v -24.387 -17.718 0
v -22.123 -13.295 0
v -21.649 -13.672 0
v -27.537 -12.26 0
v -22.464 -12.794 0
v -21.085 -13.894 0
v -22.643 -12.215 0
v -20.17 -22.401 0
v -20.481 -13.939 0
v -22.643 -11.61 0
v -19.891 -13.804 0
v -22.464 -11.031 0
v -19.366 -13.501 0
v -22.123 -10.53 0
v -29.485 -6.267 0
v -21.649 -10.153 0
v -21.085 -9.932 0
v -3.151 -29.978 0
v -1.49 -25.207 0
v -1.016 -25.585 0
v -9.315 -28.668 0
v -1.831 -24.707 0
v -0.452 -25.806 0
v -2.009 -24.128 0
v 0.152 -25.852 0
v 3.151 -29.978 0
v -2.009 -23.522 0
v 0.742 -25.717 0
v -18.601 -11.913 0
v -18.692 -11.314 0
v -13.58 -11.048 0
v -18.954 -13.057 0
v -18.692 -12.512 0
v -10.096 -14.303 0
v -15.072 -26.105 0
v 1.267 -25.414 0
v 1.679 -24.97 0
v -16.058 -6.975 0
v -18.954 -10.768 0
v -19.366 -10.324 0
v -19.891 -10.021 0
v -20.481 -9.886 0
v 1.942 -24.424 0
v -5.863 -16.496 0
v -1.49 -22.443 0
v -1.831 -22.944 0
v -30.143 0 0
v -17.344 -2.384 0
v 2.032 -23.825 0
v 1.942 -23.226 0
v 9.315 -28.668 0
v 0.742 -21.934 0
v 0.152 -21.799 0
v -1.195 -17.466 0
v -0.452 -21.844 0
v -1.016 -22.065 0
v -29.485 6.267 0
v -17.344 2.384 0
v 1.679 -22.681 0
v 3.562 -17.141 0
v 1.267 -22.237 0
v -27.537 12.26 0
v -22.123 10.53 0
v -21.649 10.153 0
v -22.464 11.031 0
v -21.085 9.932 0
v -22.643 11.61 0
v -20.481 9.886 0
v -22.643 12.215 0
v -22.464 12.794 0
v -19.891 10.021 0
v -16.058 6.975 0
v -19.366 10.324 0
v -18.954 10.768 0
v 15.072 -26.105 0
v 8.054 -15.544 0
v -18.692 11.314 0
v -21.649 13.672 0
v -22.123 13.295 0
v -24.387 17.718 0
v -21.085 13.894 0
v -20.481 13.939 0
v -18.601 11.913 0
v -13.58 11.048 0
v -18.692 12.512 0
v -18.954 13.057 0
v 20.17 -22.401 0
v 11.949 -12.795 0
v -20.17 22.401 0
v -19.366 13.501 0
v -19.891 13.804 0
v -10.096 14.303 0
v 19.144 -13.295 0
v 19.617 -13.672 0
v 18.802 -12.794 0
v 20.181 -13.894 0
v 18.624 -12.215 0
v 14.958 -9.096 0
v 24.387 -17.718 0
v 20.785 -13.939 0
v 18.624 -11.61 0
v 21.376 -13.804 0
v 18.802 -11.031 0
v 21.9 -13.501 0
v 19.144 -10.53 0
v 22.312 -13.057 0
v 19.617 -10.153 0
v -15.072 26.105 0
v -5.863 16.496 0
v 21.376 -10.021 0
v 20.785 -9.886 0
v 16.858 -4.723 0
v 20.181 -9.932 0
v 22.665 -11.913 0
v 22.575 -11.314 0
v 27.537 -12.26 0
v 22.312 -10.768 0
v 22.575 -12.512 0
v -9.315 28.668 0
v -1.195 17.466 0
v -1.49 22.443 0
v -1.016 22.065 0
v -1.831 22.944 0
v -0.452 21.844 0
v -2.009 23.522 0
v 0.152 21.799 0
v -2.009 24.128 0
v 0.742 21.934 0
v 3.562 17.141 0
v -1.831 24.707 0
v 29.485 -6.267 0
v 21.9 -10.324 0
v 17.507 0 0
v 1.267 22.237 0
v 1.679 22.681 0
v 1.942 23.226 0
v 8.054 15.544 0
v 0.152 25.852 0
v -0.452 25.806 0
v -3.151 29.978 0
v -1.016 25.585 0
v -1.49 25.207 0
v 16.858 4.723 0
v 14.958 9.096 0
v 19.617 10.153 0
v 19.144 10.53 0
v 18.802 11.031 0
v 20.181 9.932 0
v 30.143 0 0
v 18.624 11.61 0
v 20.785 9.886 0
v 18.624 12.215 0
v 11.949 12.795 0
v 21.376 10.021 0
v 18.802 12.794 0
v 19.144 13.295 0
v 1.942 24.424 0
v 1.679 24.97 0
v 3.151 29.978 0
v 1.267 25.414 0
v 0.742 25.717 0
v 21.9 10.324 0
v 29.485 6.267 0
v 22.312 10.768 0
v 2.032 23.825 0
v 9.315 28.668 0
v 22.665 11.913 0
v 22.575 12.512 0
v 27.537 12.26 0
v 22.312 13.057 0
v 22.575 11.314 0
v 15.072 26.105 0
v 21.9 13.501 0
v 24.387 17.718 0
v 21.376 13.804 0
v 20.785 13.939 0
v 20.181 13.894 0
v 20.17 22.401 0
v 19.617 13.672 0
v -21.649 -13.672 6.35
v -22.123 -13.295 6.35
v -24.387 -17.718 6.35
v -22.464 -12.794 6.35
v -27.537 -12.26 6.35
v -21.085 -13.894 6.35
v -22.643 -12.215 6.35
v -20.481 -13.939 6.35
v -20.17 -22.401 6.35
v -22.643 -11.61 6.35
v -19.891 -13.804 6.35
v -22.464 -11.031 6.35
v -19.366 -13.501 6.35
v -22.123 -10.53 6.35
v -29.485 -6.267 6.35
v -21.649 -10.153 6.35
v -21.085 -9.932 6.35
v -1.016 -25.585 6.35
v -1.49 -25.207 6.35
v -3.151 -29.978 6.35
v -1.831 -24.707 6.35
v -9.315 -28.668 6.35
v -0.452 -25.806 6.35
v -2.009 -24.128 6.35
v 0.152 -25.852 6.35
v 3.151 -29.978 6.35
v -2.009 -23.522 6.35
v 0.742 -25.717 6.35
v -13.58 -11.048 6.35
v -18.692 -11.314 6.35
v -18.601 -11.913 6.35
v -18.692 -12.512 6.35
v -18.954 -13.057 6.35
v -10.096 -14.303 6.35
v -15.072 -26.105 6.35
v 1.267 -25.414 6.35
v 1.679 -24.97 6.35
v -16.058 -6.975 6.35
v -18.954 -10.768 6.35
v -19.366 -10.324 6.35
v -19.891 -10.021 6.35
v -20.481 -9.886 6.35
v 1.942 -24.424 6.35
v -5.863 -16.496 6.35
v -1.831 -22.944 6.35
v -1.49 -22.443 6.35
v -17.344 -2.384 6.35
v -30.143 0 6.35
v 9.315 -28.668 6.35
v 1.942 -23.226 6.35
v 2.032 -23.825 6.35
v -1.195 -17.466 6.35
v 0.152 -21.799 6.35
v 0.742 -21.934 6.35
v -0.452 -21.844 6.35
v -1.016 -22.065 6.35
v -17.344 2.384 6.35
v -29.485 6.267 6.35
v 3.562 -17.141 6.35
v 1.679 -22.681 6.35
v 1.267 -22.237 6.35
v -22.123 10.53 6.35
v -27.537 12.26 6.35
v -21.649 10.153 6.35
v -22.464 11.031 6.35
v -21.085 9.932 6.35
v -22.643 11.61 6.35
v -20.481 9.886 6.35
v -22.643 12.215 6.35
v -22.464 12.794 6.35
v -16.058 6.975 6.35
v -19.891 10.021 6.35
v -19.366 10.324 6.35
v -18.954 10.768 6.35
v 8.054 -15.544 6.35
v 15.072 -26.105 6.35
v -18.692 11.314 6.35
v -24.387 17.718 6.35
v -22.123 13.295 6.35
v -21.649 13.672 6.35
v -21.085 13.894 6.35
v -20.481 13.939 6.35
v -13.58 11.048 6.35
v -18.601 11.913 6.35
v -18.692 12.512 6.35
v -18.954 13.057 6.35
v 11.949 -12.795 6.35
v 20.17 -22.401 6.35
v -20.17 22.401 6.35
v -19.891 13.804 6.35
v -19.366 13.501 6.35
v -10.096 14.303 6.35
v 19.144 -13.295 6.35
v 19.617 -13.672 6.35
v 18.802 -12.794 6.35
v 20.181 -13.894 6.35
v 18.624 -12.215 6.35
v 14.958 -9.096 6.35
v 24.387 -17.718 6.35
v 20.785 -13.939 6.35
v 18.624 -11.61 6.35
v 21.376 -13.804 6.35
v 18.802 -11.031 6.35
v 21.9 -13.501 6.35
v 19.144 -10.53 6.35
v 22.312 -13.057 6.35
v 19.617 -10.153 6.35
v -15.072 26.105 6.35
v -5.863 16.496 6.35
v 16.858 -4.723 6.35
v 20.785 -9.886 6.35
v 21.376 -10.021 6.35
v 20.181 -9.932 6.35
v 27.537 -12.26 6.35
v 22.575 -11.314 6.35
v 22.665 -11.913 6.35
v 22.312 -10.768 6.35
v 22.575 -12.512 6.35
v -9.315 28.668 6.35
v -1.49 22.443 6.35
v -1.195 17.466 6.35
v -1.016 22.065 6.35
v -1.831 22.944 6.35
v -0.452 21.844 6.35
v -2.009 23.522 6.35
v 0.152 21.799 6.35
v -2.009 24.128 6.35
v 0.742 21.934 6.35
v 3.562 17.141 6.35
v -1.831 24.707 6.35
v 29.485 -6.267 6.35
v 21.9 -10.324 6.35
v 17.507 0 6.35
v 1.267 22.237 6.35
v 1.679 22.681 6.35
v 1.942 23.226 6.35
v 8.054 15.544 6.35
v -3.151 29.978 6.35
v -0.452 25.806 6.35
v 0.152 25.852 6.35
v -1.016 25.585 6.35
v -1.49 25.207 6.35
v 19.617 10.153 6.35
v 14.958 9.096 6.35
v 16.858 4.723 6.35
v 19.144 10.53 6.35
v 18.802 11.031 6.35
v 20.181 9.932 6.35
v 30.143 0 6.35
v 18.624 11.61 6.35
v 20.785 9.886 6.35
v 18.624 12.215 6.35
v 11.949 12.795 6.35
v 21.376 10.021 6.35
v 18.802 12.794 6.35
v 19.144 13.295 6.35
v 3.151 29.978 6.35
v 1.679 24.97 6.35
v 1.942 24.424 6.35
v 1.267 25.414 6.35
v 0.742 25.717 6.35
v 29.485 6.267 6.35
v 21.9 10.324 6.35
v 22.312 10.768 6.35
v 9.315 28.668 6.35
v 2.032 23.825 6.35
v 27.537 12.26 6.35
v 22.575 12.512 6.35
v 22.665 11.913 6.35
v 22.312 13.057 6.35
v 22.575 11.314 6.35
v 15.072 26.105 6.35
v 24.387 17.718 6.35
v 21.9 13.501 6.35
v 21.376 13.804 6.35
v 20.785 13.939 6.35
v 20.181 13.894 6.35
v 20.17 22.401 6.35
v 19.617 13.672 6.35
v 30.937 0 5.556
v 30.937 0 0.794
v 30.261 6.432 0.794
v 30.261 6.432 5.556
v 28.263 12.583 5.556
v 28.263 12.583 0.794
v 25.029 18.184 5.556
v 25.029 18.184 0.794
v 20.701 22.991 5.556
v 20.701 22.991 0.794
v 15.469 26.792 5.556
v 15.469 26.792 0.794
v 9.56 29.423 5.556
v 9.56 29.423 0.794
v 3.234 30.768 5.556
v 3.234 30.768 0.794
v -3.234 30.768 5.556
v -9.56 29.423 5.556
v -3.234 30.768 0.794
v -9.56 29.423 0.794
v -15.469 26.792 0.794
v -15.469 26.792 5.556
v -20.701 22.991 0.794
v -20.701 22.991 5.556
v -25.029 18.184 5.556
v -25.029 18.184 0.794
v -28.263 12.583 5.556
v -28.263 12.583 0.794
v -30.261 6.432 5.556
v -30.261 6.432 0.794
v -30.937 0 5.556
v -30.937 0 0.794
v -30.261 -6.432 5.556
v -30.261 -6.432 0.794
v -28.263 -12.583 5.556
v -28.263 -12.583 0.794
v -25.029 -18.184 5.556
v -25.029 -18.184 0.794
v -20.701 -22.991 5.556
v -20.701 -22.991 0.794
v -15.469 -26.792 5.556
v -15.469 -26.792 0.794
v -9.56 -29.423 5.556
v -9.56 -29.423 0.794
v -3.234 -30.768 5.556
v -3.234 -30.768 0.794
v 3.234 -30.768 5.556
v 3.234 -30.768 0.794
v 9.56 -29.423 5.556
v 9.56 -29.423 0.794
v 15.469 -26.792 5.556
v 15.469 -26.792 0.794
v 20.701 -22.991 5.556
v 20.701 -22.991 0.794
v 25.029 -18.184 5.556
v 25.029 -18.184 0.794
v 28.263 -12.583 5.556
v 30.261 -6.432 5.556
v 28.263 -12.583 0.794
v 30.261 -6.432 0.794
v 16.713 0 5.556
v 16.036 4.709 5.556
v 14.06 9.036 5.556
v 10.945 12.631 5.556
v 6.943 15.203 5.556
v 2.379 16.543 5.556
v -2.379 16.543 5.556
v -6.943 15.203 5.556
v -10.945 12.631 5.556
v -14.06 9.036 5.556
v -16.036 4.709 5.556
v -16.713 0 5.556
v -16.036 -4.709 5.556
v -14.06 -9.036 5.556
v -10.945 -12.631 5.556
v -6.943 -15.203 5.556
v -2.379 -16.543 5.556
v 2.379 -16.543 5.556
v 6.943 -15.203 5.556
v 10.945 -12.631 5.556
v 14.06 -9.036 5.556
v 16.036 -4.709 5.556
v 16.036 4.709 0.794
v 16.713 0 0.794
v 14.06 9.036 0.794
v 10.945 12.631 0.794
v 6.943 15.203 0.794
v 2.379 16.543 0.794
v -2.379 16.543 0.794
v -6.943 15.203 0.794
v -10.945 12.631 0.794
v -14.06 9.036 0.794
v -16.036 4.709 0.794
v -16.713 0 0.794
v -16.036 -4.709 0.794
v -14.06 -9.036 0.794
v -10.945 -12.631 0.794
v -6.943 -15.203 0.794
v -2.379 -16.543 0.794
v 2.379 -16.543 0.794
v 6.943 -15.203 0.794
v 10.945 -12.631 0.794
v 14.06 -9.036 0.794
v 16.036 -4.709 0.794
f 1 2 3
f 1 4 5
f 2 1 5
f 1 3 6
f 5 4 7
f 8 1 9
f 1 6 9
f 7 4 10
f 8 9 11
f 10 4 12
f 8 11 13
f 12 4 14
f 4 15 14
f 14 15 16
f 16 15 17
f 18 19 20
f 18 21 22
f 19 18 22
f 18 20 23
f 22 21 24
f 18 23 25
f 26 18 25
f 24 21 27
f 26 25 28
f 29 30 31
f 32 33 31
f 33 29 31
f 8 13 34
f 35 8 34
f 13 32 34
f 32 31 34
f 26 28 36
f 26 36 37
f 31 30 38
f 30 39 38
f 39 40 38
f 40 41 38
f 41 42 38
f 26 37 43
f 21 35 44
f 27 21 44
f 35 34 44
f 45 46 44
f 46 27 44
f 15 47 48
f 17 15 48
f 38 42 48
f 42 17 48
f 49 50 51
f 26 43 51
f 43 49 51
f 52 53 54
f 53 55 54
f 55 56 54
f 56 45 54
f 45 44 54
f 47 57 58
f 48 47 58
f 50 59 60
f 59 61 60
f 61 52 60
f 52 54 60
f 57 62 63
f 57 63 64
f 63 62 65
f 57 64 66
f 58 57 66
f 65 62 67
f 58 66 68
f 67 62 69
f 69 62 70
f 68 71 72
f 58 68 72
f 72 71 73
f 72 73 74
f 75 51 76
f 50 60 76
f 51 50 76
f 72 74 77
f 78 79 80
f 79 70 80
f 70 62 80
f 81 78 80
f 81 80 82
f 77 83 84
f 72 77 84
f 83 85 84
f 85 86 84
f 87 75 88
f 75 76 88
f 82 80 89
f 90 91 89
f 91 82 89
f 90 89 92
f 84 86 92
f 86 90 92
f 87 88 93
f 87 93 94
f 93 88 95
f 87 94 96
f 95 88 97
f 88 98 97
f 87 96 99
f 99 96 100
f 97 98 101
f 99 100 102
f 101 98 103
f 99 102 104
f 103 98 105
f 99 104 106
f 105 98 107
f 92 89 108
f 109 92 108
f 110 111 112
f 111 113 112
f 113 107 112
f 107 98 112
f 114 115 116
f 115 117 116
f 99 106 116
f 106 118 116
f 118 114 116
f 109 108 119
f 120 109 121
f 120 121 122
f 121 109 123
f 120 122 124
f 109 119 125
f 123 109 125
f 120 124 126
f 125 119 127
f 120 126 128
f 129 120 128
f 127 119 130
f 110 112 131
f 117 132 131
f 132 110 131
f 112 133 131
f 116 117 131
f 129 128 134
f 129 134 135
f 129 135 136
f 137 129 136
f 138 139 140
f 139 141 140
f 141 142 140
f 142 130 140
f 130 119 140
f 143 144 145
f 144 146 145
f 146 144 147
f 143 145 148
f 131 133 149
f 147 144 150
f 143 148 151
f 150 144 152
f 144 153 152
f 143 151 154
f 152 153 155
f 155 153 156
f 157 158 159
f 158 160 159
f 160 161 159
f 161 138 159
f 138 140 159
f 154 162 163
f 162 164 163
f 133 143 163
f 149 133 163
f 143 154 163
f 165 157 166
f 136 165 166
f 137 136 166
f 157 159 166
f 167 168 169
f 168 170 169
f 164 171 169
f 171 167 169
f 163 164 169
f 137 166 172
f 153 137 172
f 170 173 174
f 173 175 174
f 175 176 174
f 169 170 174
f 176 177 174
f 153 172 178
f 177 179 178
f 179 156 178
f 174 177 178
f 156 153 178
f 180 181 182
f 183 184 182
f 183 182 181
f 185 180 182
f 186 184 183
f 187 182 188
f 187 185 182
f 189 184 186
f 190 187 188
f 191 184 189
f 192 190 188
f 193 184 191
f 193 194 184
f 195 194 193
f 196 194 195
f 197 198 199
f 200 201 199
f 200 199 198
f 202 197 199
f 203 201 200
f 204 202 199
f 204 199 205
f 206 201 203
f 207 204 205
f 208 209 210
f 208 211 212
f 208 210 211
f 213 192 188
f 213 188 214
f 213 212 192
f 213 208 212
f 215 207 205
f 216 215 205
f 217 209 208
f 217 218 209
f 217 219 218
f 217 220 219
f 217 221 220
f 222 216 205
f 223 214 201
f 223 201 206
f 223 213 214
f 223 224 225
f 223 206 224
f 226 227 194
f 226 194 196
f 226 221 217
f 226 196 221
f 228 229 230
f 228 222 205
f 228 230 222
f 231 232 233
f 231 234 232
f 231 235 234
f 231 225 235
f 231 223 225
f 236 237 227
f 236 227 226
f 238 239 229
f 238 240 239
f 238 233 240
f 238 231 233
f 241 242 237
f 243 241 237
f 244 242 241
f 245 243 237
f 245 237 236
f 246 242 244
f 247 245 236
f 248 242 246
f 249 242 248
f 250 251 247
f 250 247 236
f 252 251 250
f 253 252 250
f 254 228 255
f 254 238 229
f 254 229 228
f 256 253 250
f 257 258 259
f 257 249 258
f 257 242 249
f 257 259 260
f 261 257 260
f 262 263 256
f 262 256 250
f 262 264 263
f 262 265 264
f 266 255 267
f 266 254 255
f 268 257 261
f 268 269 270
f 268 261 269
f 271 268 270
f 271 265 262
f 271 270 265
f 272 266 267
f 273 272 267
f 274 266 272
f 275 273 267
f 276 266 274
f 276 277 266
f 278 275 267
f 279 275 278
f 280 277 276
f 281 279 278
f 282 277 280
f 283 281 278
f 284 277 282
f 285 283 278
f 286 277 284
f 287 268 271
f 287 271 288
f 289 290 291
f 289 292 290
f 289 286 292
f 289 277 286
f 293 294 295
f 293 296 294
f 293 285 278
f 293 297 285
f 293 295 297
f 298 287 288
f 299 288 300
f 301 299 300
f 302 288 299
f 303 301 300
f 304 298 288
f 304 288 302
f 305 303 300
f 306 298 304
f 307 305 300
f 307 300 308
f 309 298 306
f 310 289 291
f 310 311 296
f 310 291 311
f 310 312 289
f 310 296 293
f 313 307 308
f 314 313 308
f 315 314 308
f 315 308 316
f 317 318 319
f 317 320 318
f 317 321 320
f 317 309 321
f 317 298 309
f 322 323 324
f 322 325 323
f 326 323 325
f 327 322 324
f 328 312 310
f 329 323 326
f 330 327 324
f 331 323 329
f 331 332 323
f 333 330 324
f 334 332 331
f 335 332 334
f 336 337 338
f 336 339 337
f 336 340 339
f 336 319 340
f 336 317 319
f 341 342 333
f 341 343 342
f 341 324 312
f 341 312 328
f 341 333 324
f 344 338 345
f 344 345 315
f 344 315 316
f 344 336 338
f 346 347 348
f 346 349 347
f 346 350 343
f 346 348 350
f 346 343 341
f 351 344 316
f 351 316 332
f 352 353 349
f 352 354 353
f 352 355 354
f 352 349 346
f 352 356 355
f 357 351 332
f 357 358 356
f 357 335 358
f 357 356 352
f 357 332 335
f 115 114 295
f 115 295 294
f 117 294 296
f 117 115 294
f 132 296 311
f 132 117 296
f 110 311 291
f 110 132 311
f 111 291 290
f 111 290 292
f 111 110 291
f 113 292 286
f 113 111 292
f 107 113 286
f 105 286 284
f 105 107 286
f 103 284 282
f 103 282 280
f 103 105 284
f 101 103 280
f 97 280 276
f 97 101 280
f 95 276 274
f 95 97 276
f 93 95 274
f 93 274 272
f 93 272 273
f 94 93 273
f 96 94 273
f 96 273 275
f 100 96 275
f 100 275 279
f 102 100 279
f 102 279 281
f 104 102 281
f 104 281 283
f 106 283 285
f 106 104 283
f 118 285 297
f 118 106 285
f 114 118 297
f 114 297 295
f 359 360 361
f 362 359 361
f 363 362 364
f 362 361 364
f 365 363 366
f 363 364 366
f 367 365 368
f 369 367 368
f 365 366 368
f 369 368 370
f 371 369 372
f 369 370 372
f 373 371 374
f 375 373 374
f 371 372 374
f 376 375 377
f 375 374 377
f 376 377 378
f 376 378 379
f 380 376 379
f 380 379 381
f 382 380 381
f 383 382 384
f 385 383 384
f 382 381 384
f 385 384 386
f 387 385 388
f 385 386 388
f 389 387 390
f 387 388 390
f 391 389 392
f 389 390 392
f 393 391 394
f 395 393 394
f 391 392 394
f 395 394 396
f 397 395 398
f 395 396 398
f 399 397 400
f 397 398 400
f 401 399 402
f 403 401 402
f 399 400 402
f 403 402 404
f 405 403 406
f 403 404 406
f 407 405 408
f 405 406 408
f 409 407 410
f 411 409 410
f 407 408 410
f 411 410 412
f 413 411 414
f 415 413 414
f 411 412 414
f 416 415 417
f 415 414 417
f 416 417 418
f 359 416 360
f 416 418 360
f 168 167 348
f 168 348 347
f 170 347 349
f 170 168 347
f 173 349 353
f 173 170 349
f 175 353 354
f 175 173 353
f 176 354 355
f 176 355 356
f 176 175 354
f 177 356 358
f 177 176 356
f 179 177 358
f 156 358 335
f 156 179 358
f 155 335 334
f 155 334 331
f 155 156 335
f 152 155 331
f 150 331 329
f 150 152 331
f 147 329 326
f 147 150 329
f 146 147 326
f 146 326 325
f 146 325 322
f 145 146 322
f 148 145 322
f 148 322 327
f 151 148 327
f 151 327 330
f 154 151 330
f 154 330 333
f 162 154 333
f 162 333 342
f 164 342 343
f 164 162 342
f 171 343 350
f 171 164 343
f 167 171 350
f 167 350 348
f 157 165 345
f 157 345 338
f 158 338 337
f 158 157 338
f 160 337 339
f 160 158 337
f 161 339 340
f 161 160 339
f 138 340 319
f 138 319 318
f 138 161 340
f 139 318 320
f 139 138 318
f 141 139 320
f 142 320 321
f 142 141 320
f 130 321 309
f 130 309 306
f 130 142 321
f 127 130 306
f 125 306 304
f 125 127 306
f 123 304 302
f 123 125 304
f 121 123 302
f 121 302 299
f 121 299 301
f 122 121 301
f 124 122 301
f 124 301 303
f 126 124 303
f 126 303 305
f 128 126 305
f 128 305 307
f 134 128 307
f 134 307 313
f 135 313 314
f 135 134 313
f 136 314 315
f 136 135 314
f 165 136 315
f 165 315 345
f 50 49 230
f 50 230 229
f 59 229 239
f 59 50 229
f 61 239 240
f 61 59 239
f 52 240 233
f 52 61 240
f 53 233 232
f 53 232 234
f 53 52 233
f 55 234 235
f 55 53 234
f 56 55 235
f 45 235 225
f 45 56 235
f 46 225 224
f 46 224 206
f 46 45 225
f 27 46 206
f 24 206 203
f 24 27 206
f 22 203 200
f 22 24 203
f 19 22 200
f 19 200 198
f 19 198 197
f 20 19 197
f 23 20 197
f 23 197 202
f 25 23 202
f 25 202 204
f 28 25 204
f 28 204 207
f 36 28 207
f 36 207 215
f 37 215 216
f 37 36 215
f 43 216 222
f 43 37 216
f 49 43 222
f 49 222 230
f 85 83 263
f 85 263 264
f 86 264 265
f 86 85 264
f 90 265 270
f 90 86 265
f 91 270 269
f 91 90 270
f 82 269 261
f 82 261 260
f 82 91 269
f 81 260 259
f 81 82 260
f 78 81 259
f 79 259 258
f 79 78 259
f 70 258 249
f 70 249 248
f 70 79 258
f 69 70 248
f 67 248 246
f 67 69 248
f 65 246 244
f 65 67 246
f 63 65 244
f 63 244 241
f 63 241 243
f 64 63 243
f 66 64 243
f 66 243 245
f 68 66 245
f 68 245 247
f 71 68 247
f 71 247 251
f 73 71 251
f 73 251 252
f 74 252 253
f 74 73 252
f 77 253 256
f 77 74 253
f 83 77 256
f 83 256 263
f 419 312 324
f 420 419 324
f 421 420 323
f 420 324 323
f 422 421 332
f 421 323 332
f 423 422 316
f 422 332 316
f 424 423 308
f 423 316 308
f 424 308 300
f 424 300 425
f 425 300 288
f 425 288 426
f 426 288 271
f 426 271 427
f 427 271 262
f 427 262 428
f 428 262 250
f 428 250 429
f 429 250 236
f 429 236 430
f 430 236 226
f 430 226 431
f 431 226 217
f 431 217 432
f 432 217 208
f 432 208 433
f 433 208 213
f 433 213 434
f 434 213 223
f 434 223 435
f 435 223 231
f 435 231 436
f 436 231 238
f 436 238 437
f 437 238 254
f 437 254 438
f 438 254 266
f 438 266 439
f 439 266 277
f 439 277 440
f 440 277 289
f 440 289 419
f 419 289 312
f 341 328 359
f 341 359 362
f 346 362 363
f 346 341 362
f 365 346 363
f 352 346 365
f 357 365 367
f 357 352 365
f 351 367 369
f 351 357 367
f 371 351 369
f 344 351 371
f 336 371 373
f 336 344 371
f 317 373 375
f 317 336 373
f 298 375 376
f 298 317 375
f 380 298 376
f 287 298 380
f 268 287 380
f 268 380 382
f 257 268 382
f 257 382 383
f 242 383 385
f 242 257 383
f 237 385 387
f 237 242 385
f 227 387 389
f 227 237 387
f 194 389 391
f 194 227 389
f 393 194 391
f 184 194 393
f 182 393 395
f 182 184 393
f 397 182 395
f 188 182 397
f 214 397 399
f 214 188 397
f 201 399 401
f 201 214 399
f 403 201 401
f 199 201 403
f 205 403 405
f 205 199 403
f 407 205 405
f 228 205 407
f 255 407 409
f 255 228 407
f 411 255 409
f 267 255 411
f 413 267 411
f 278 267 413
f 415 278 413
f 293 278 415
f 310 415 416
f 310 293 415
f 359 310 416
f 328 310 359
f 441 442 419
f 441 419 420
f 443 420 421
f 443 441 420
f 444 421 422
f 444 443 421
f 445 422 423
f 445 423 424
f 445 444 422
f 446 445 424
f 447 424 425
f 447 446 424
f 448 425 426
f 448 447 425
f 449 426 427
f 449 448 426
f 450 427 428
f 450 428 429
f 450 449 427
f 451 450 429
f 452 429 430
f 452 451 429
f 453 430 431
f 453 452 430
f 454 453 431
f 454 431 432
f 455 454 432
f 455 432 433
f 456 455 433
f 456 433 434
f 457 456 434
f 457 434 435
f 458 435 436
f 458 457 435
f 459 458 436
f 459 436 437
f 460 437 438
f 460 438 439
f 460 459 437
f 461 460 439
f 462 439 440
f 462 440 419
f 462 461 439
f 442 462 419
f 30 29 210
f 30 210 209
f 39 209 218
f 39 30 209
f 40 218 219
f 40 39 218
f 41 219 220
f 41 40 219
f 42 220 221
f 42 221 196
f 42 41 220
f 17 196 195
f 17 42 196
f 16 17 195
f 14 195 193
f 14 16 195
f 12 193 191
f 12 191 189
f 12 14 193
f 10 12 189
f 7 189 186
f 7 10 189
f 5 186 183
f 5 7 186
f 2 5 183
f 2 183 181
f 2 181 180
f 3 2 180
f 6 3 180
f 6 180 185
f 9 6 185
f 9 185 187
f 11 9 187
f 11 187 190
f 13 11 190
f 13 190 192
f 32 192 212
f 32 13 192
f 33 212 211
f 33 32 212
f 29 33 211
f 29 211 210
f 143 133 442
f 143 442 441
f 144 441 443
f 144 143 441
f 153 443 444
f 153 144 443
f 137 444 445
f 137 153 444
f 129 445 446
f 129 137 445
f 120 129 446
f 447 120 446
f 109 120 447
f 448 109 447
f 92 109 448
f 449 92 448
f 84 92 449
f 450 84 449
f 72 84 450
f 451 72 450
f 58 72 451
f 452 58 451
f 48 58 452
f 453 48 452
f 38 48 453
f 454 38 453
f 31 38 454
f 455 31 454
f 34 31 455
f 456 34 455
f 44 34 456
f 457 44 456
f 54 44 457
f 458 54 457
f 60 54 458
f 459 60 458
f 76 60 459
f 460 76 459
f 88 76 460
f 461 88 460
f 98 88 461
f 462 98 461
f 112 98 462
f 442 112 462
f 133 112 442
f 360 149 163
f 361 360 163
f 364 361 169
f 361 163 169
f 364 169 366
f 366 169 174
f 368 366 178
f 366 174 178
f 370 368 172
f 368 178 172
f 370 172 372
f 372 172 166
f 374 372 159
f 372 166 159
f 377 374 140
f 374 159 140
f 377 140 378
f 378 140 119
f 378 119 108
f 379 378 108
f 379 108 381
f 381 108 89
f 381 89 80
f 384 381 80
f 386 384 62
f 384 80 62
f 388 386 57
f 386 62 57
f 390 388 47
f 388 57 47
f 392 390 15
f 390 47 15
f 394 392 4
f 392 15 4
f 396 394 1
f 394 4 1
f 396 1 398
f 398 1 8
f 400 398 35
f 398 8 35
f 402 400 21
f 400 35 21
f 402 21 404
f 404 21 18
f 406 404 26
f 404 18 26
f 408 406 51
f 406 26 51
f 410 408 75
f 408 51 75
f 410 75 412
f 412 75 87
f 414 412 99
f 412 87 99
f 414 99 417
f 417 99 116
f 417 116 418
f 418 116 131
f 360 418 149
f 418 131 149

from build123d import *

# Parameters (mm, degrees)
SKETCH1_R           = 30.9372
SKETCH1_R_2         = 2.032
SKETCH1_R_3         = 16.7132
BOSS_EXTRUDE1_DEPTH = 6.35
CHAMFER1_SIZE       = 0.79375


with BuildPart() as part:
    # Sketch1 → Boss-Extrude1 (new body)
    with BuildSketch(Plane.XY):
        Circle(SKETCH1_R)
        with Locations((0, 23.8252)):
            Circle(SKETCH1_R_2, mode=Mode.SUBTRACT)
        Circle(SKETCH1_R_3, mode=Mode.SUBTRACT)
        with Locations((20.63322845, 11.9126)):
            Circle(SKETCH1_R_2, mode=Mode.SUBTRACT)
        with Locations((20.63322845, -11.9126)):
            Circle(SKETCH1_R_2, mode=Mode.SUBTRACT)
        with Locations((0, -23.8252)):
            Circle(SKETCH1_R_2, mode=Mode.SUBTRACT)
        with Locations((-20.63322845, -11.9126)):
            Circle(SKETCH1_R_2, mode=Mode.SUBTRACT)
        with Locations((-20.63322845, 11.9126)):
            Circle(SKETCH1_R_2, mode=Mode.SUBTRACT)
    extrude(amount=BOSS_EXTRUDE1_DEPTH)

    # Chamfer1
    chamfer1_edges = [part.edges().sort_by_distance(p)[0] for p in [
        (-30.9372, 0, 0),
        (-30.9372, 0, 6.35),
        (-16.7132, 0, 0),
        (-16.7132, 0, 6.35),
    ]]
    chamfer(chamfer1_edges, length=CHAMFER1_SIZE)


solid = part.part
